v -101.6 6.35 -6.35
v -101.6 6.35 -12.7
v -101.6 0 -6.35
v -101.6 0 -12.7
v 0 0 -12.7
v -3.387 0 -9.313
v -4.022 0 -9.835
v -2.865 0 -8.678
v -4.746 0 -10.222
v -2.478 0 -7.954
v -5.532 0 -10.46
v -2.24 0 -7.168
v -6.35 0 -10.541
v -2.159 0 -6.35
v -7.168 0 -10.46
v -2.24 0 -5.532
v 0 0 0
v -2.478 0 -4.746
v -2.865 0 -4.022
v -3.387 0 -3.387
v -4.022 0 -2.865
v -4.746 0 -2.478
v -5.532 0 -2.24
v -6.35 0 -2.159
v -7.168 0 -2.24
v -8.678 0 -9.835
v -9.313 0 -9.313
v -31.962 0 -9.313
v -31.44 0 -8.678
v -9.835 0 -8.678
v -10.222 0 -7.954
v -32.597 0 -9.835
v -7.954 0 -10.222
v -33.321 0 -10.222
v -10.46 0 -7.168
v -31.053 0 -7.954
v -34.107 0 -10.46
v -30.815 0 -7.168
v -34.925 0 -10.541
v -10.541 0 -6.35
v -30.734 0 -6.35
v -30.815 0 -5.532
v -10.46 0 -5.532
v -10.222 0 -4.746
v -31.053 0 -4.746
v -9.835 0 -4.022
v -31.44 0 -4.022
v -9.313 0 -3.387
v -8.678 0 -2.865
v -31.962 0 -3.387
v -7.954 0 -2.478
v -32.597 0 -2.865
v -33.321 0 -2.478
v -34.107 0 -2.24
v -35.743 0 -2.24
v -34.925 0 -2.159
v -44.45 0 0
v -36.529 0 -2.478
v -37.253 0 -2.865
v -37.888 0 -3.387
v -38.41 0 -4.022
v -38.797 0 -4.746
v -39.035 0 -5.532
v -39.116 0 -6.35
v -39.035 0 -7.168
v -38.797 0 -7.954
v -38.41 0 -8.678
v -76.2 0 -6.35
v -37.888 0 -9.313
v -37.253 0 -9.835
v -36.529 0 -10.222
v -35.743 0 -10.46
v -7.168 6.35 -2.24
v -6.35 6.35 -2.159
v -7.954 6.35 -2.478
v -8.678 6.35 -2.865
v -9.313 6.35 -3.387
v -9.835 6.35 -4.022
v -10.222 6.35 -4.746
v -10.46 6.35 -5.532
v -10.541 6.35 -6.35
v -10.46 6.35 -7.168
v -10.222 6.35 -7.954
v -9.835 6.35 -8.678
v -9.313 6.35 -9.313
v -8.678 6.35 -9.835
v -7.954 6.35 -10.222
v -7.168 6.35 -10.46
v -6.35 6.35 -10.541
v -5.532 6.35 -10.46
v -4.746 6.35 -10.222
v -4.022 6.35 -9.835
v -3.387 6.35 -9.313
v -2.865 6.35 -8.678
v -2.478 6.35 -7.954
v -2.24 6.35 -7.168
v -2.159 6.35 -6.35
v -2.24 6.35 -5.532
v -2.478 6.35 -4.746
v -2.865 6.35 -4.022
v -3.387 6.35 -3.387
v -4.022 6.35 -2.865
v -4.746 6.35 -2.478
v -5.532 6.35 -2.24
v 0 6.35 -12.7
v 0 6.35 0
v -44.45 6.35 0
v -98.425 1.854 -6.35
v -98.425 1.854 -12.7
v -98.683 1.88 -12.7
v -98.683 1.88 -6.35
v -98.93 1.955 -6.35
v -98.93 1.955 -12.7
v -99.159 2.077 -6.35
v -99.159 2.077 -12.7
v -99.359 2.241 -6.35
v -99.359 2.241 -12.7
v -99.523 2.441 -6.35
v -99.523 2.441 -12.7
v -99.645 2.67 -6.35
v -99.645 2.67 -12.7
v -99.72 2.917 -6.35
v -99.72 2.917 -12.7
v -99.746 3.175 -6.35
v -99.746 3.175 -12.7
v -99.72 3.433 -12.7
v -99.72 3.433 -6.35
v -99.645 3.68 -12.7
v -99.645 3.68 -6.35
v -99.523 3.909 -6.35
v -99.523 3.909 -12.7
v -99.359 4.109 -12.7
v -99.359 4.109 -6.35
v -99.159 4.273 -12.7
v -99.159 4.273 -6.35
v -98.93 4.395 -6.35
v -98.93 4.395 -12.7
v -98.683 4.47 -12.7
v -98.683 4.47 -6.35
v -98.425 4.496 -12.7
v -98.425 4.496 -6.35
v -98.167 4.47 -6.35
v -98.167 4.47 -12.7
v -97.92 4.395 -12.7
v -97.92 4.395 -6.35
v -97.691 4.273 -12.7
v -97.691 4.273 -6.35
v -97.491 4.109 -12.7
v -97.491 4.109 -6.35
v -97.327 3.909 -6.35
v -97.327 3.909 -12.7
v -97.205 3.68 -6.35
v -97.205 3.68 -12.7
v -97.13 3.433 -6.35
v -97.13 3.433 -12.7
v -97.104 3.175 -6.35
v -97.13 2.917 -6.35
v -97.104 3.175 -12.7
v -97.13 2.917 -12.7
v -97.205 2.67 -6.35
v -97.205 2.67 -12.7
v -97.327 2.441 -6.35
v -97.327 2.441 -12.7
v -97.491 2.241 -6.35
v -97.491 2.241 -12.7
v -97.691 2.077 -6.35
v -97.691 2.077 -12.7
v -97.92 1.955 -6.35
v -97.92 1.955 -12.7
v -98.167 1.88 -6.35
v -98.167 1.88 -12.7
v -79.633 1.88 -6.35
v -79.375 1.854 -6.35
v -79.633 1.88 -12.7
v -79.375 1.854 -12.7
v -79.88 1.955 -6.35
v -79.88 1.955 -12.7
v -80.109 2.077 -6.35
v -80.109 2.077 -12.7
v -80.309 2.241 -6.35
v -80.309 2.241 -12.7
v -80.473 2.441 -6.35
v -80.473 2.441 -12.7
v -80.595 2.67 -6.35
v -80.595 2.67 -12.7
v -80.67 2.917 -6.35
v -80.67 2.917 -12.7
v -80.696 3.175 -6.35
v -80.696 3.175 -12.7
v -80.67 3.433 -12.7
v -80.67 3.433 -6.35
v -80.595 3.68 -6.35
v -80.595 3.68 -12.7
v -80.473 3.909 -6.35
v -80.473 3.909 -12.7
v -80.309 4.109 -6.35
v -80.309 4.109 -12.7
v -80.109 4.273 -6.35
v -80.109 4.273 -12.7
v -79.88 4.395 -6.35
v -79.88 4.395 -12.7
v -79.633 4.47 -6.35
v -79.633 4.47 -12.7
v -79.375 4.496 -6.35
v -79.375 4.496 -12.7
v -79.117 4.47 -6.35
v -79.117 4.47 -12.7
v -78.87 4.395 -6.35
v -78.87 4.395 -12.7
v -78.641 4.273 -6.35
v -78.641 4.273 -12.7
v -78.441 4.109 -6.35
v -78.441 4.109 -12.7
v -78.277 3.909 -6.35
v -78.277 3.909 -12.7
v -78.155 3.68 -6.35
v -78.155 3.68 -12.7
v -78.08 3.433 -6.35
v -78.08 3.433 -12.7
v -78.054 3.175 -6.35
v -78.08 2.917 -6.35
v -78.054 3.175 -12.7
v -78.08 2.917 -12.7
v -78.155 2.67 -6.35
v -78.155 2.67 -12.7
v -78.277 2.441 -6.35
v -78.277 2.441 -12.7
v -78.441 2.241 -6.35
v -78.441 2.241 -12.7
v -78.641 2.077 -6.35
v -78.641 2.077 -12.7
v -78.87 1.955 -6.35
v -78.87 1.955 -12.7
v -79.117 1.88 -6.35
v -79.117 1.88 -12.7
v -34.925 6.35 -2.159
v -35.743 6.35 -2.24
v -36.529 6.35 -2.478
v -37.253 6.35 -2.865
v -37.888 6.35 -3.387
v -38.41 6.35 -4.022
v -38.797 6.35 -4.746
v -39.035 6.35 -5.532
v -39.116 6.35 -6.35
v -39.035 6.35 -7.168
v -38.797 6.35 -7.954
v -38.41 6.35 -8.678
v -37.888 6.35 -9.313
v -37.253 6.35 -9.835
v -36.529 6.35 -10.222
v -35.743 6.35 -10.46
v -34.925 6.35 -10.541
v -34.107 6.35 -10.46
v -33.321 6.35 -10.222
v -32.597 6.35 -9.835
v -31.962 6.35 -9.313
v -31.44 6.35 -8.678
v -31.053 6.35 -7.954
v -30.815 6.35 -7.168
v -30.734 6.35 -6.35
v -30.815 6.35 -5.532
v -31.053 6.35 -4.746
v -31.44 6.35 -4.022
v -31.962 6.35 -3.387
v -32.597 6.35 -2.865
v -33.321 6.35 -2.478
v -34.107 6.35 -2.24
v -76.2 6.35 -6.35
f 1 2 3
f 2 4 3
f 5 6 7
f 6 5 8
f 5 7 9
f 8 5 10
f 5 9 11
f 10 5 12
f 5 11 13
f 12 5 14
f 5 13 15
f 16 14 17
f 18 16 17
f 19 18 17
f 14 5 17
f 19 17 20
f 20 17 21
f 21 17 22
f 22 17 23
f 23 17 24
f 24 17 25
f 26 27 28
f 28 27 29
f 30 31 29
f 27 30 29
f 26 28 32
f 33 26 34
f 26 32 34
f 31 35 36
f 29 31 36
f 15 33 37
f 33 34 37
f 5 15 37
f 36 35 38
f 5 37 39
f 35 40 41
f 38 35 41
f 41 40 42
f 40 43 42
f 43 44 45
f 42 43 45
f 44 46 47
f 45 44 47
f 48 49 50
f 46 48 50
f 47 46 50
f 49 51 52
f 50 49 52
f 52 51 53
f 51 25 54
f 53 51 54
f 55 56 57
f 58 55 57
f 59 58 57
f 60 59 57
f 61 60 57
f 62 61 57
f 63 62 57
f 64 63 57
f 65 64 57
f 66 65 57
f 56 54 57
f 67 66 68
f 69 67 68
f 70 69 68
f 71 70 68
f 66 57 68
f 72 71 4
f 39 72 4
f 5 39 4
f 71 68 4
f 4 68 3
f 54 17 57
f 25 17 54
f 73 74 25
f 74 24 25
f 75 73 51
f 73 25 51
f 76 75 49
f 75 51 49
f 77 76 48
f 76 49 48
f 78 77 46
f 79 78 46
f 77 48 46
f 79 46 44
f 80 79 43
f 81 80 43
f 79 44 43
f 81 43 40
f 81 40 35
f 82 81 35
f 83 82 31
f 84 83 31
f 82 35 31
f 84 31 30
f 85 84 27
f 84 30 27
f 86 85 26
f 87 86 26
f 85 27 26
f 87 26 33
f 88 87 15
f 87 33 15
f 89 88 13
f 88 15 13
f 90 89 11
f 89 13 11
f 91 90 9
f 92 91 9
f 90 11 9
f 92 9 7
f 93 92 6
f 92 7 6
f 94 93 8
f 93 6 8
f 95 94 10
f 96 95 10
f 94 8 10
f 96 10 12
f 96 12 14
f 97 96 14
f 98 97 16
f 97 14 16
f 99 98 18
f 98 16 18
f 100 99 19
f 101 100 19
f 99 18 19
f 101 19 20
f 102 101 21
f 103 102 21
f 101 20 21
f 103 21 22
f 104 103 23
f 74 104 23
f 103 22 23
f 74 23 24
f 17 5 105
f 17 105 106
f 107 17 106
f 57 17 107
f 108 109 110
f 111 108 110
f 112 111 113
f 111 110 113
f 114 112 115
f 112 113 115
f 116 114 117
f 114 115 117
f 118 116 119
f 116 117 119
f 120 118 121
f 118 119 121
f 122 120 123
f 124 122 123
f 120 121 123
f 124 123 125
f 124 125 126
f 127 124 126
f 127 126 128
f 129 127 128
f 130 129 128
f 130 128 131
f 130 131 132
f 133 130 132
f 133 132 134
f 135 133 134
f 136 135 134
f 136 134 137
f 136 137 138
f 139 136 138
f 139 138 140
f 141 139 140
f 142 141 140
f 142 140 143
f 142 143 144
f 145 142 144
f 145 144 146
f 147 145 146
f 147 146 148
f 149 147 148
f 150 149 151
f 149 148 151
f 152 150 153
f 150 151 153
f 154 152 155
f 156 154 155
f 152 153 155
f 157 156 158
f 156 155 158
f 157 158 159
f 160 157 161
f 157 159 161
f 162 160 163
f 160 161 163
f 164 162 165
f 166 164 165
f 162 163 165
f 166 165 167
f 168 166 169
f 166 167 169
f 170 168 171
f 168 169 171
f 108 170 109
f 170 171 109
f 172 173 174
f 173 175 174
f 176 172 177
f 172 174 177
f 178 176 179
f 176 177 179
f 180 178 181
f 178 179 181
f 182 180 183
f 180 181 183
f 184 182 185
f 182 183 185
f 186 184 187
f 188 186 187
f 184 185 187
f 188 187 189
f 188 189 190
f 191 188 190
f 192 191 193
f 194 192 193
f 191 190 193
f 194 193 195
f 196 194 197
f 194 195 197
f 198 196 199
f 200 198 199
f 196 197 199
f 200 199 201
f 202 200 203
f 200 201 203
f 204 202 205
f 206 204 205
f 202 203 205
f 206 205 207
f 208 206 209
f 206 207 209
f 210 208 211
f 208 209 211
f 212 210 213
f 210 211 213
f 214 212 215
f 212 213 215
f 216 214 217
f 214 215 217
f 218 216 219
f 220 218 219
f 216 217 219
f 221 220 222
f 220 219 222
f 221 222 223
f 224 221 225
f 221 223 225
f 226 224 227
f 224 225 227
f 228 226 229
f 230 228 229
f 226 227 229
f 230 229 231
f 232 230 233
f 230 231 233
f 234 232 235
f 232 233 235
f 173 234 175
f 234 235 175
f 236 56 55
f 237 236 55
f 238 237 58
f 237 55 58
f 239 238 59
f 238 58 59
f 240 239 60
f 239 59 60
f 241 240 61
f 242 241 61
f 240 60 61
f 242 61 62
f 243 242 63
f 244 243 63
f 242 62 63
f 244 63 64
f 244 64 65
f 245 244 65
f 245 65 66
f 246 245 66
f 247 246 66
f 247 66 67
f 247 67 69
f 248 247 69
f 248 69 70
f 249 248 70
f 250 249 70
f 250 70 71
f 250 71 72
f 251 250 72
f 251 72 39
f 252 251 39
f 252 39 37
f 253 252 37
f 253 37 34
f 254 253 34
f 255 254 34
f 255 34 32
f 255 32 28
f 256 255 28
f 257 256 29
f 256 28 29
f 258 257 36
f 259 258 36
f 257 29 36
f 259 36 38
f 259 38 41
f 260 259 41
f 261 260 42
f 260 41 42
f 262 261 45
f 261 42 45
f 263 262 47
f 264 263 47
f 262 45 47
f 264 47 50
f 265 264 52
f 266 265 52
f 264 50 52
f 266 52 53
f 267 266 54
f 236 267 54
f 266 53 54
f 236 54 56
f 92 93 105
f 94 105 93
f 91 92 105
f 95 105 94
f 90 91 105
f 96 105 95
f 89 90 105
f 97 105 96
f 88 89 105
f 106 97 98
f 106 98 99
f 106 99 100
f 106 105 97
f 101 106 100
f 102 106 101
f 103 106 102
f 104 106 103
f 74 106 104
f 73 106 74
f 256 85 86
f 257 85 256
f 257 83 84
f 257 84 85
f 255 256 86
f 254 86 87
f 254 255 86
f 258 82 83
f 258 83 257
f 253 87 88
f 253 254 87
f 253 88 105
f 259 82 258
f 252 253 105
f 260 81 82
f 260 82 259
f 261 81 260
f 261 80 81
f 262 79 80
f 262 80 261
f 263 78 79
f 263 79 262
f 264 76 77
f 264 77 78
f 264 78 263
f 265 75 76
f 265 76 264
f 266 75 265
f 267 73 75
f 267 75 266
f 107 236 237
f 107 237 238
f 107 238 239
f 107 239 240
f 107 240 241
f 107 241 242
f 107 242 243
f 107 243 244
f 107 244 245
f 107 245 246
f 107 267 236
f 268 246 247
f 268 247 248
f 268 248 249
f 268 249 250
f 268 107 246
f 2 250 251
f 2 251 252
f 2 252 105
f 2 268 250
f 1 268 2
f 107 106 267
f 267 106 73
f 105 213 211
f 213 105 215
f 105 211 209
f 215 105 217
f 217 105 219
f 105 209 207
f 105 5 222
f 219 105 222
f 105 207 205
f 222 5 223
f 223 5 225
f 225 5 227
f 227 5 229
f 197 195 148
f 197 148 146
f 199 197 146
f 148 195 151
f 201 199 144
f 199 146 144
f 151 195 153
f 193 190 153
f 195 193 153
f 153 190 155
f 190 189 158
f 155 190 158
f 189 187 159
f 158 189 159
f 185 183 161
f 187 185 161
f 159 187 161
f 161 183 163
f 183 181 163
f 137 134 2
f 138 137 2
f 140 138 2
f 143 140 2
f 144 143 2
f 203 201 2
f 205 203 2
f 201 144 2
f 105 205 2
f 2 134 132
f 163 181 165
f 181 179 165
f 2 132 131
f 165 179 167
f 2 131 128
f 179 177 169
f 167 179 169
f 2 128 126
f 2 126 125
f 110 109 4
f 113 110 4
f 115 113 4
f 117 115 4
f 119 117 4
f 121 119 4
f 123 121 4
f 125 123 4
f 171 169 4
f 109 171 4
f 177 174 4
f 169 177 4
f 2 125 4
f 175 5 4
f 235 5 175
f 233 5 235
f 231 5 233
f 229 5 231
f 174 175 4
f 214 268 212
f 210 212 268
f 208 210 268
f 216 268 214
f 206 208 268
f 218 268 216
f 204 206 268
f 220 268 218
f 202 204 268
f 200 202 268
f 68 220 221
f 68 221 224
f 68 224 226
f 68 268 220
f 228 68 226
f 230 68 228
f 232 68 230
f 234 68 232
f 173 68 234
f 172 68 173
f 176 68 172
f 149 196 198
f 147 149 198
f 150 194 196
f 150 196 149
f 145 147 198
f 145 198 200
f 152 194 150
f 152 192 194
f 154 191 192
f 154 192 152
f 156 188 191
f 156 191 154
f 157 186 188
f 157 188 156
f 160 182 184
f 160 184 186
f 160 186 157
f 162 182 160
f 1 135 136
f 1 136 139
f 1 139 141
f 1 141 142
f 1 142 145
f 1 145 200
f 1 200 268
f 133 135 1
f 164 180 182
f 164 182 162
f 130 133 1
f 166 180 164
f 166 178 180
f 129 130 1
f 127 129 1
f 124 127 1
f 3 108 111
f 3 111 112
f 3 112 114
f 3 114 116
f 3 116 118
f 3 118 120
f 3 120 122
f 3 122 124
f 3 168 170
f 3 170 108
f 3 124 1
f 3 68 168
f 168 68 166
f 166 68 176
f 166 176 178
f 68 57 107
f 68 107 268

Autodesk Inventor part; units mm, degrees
ref_plane "YZ Plane" through (0, 0, 0) normal (1, 0, 0) x (0, 1, 0)
ref_plane "XZ Plane" through (0, 0, 0) normal (0, 1, 0) x (-1, 0, 0)
ref_plane "XY Plane" through (0, 0, 0) normal (0, 0, 1) x (1, 0, 0)
sketch "Sketch1" plane through (0, 0, 0) normal (0, 1, 0) x (-1, 0, 0)
  line L0 (0, 0) -> (101.6, 0)
  line L1 (0, -12.7) -> (44.45, -12.7)
  line L2 (44.45, -12.7) -> (76.2, -12.7)
  line L3 (44.45, 0) -> (76.2, -6.35)
  line L4 (76.2, -6.35) -> (101.6, -6.35)
  line L5 (76.2, -12.7) -> (101.6, -12.7)
  line L6 (0, -12.7) -> (0, 0)
  line L7 (101.6, -12.7) -> (101.6, -6.35)
  point P0 (101.6, -6.35)
  dimension "d5" = 44.45
  dimension "d6" = 12.7
  dimension "d7" = 44.45
  dimension "d16" = 6.35
  dimension "d55" = 6.35
  dimension "d58" = 31.75
  dimension "d59" = 101.6
extrude "Extrusion2" add sketch "Sketch1" along normal blind 6.35
sketch "Sketch5" plane through (0, 6.35, 0) normal (0, 1, 0) x (1, 0, 0)
  line L0 (-44.45, 0) -> (0, 0) projected
  line L1 (0, 0) -> (0, 12.7) projected
  line L2 (0, 12.7) -> (-101.6, 12.7) projected
  line L3 (-101.6, 12.7) -> (-101.6, 6.35) projected
  line L4 (-101.6, 6.35) -> (-76.2, 6.35) projected
  line L5 (-76.2, 6.35) -> (-44.45, 0) projected
  point P0 (-6.35, 6.35)
  point P1 (-34.925, 6.35)
  dimension "d60" = 6.35
  dimension "d61" = 6.35
  dimension "d62" = 6.35
  dimension "d63" = 28.575
  dimension "d64" = 12.7
hole "Hole4" at (-6.35, 6.35, -6.35) at (-34.925, 6.35, -6.35) direction (0, -1, 0) diameter 8.382 depth 25.4 tip angle 118
sketch "Sketch6" plane through (-101.6, 0, -6.35) normal (0, 0, 1) x (1, 0, 0)
  line L0 (25.4, 0) -> (0, 0) projected
  line L1 (25.4, 0) -> (25.4, 6.35) projected
  line L2 (0, 6.35) -> (25.4, 6.35) projected
  line L3 (0, 0) -> (0, 6.35) projected
  point P0 (101.6, 0)
  point P1 (3.175, 3.175)
  point P2 (22.225, 3.175)
  dimension "d72" = 6.35
  dimension "d73" = 3.175
  dimension "d74" = 3.175
  dimension "d75" = 19.05
  dimension "d76" = 3.175
hole "Hole5" at (-98.425, 3.175, -6.35) at (-79.375, 3.175, -6.35) direction (0, 0, -1) diameter 2.6416 depth 10.9728 tip angle 118 thread size "6-32 UNC" class "2B" standard "ANSI Unified Screw Threads"
equation "\"d5\" = d10"
equation "\"d7\" = d5"
equation "\"d60\" = 0.5 * d64"
equation "\"d61\" = d60"
equation "\"d62\" = d60"
equation "\"d73\" = 0.5 * d72"
equation "\"d74\" = d73"
equation "\"d76\" = d73"
equation "\"d10\" = 44.45"
properties part number "WheelSuspensionFork" material "Aluminum 6061"
